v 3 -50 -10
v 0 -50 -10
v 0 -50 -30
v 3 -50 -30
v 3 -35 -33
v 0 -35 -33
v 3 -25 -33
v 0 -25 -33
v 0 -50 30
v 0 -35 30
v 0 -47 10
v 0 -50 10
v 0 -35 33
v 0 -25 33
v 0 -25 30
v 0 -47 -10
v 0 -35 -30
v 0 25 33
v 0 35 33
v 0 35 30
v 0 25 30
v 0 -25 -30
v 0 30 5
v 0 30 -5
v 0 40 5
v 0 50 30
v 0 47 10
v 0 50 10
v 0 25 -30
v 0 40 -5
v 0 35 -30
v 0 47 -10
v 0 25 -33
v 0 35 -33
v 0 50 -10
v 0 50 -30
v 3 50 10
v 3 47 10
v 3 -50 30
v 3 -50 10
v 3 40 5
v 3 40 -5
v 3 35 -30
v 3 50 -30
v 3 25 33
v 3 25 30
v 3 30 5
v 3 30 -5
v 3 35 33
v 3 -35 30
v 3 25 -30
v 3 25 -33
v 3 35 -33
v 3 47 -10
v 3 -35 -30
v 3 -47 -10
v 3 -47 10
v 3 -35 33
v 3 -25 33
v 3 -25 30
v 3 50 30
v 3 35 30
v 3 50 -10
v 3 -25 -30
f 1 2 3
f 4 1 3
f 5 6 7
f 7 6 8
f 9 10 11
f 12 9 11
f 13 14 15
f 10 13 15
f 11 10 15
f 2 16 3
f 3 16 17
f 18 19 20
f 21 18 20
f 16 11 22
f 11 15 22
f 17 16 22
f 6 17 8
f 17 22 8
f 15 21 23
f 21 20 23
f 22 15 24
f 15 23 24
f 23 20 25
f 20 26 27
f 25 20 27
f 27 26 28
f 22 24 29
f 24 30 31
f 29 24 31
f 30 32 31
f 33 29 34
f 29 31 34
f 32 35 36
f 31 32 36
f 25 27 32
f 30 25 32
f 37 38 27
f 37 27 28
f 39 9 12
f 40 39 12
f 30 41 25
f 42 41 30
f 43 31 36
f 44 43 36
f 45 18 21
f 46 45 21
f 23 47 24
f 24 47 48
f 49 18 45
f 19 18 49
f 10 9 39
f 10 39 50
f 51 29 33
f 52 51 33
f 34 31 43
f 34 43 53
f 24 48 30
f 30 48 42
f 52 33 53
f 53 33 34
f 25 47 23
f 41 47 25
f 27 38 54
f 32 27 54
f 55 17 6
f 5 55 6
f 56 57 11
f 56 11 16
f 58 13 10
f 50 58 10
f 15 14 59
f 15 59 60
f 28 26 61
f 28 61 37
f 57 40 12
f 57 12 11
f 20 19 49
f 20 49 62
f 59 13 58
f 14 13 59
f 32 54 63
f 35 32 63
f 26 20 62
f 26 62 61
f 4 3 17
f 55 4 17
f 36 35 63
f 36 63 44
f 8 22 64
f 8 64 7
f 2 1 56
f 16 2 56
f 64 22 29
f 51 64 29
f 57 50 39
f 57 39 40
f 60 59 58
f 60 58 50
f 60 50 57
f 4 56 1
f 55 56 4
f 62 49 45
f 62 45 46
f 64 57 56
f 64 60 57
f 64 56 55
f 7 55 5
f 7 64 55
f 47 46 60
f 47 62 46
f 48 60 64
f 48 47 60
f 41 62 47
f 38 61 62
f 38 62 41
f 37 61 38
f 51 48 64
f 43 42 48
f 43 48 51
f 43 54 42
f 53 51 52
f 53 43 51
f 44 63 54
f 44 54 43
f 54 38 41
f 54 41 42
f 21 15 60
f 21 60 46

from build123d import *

# Parameters (mm, degrees)
SKETCH1_W           = 60
SKETCH1_H           = 100
BOSS_EXTRUDE1_DEPTH = 3
SKETCH2_W           = 3
SKETCH2_H           = 10
BOSS_EXTRUDE2_DEPTH = 3
SKETCH3_W           = 20
SKETCH3_H           = 3
CUT_EXTRUDE1_DEPTH  = 3
SKETCH4_W           = 10
SKETCH4_H           = 10
CUT_EXTRUDE2_DEPTH  = 3


with BuildPart() as part:
    # Sketch1 → Boss-Extrude1 (new body)
    with BuildSketch(Plane(origin=(0, 0, 0), x_dir=(0, 0, -1), z_dir=(1, 0, 0))):
        Rectangle(SKETCH1_W, SKETCH1_H)
    extrude(amount=BOSS_EXTRUDE1_DEPTH)

    # Sketch2 → Boss-Extrude2 (add)
    with BuildSketch(Plane(origin=(0, 0, 0), x_dir=(0, 0, -1), z_dir=(1, 0, 0))):
        with Locations((-31.5, -30)):
            Rectangle(SKETCH2_W, SKETCH2_H)
        with Locations((-31.5, 30)):
            Rectangle(SKETCH2_W, SKETCH2_H)
        with Locations((31.5, 30)):
            Rectangle(SKETCH2_W, SKETCH2_H)
        with Locations((31.5, -30)):
            Rectangle(SKETCH2_W, SKETCH2_H)
    extrude(amount=BOSS_EXTRUDE2_DEPTH)

    # Sketch3 → Cut-Extrude1 (cut)
    with BuildSketch(Plane(origin=(3, 0, 0), x_dir=(0, 0, -1), z_dir=(1, 0, 0))):
        with Locations((0, 48.5)):
            Rectangle(SKETCH3_W, SKETCH3_H)
        with Locations((0, -48.5)):
            Rectangle(SKETCH3_W, SKETCH3_H)
    extrude(amount=-CUT_EXTRUDE1_DEPTH, mode=Mode.SUBTRACT)

    # Sketch4 → Cut-Extrude2 (cut)
    with BuildSketch(Plane(origin=(3, 0, 0), x_dir=(0, 0, -1), z_dir=(1, 0, 0))):
        with Locations((0, 35)):
            Rectangle(SKETCH4_W, SKETCH4_H)
    extrude(amount=-CUT_EXTRUDE2_DEPTH, mode=Mode.SUBTRACT)


solid = part.part
